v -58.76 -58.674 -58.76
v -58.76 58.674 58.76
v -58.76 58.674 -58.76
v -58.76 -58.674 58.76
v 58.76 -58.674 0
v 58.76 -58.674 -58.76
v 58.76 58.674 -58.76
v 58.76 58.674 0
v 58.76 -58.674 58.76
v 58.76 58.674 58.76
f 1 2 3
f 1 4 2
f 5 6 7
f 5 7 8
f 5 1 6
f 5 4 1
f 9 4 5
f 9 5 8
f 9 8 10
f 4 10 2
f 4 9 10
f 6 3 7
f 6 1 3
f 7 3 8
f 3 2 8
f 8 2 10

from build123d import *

# Parameters (mm, degrees)
F2_DEPTH = 58.674


# Not quite as in the source:
# - ends of sketch curves that miss each other by under 0.0002 mm in the source are joined
# - the program builds the solid bodies; features that only make, move or delete a surface that nothing else refers to are left out


with BuildPart() as f2:
    # F0 (on Front) → F2 (new body, symmetric)
    with BuildSketch(Plane.XZ):
        with BuildLine():
            Line((-58.7595701218, -58.7595747784), (0, -58.7595747784))
            ThreePointArc((0, -58.7595747784), (41.5492937854, -41.5492937854), (58.7595747784, 0))
            ThreePointArc((58.7595747784, 0), (41.5492937854, 41.5492937854), (0, 58.7595747784))
            Line((0, 58.7595747784), (-58.7595701218, 58.7595747784))
            Line((-58.7595701218, 58.7595747784), (-58.7595701218, -58.7595747784))
        make_face()
        with BuildLine():
            ThreePointArc((0, 58.7595747784), (41.5492937854, 41.5492937854), (58.7595747784, 0))
            Line((58.7595747784, 0), (58.7595701218, 58.7595747784))
            Line((58.7595701218, 58.7595747784), (0, 58.7595747784))
        make_face()
        with BuildLine():
            ThreePointArc((58.7595747784, 0), (41.5492937854, -41.5492937854), (0, -58.7595747784))
            Line((0, -58.7595747784), (58.7595701218, -58.7595747784))
            Line((58.7595701218, -58.7595747784), (58.7595747784, 0))
        make_face()
    extrude(amount=F2_DEPTH, both=True)


solid = f2.part
